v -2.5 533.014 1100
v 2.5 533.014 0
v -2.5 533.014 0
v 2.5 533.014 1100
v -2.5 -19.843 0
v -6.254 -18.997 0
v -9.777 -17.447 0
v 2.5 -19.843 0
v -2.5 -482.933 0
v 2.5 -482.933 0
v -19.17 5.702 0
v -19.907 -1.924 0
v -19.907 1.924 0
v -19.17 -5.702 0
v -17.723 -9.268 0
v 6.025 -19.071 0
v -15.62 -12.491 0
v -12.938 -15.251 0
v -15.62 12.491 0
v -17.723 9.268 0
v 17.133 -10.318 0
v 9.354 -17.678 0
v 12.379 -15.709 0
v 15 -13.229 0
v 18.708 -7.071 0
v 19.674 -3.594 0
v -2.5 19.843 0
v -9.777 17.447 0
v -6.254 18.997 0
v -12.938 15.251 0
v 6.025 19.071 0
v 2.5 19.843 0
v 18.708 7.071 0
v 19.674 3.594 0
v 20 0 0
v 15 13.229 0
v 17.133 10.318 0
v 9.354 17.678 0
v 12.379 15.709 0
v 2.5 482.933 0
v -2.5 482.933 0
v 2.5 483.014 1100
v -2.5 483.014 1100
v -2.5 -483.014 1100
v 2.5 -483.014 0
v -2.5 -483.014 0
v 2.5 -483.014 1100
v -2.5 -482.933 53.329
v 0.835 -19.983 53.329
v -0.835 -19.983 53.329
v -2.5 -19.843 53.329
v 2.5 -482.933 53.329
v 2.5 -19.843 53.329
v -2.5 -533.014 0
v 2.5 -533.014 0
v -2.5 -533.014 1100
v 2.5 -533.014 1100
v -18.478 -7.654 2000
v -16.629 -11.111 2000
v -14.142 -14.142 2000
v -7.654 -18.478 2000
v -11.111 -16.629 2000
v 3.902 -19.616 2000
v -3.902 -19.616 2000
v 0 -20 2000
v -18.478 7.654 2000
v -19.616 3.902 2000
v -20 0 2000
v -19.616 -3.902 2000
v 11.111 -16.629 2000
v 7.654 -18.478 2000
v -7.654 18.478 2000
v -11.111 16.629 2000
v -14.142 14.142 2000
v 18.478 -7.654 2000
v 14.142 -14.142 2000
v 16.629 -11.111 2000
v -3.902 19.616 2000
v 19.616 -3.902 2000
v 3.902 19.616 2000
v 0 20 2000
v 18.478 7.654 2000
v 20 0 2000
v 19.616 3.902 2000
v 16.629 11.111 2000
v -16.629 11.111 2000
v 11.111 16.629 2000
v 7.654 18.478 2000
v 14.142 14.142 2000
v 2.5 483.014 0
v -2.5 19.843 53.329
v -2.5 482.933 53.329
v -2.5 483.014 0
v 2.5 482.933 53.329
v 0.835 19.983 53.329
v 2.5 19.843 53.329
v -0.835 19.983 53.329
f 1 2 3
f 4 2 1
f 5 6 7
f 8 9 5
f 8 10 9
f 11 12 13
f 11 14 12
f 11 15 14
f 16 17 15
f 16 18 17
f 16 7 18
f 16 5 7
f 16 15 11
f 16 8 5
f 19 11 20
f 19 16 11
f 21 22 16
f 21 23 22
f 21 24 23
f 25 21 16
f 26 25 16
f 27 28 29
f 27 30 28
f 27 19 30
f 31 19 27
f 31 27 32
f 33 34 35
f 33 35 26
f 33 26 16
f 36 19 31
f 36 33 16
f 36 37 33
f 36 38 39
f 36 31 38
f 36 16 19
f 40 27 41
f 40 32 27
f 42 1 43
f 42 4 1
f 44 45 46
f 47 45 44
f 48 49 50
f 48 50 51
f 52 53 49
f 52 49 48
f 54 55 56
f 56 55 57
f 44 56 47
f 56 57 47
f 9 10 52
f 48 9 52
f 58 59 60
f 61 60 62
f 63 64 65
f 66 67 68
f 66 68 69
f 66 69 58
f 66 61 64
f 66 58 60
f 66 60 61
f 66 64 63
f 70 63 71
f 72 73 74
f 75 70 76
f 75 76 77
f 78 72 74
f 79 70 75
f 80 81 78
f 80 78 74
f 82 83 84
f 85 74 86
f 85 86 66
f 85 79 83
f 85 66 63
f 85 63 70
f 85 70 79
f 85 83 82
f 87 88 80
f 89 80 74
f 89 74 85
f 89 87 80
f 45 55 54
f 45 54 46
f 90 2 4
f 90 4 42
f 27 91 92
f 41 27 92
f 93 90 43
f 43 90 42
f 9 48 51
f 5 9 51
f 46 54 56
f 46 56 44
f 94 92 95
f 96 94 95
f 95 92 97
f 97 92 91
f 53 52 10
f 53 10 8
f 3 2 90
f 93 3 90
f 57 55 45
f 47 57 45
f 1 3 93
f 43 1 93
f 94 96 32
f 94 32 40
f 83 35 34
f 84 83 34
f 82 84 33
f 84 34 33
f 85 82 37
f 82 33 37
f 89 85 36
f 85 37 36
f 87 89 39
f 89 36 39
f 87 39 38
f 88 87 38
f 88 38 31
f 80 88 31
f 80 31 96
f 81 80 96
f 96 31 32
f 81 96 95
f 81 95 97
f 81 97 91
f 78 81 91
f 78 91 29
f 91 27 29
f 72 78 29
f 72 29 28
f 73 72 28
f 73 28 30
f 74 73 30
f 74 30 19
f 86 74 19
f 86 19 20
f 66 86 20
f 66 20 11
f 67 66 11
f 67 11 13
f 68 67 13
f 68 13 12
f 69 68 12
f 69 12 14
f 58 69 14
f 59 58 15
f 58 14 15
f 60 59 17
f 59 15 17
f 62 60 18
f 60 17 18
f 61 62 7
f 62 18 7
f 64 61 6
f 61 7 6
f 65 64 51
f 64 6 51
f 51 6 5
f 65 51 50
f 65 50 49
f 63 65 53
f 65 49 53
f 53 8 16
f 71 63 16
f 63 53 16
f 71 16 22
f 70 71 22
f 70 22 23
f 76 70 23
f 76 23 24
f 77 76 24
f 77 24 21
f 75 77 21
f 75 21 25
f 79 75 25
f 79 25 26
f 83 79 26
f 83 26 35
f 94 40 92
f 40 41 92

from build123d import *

# Parameters (mm, degrees)
F0_R      = 20
F1_DEPTH  = 2000
F2_W      = 482.932776
F2_H      = 53.329304
F3_DEPTH  = 2.5
F4_DEPTH  = 2.5
F5_W      = 50
F5_H      = 1100
F6_DEPTH  = 2.5
F6_FACE_W = 50
F6_FACE_H = 1100
F7_DEPTH  = 2.5
F8_DEPTH  = 2.5


with BuildPart() as f1:
    # F0 (on Top) → F1 (new body)
    with BuildSketch(Plane.XY):
        Circle(F0_R)
    extrude(amount=F1_DEPTH)

    # F2 (on Right) → F3 (join)
    with BuildSketch(Plane.YZ):
        with Locations((-241.466388, 26.664652)):
            Rectangle(F2_W, F2_H)
        with Locations((241.466388, 26.664652)):
            Rectangle(F2_W, F2_H)
    extrude(amount=F3_DEPTH)

    # F2 (on Right) → F4 (join)
    with BuildSketch(Plane.YZ):
        with Locations((-241.466388, 26.664652)):
            Rectangle(F2_W, F2_H)
        with Locations((241.466388, 26.664652)):
            Rectangle(F2_W, F2_H)
    extrude(amount=-F4_DEPTH)


with BuildPart() as f6:
    # F5 (on Right) → F6 (new body)
    with BuildSketch(Plane.YZ):
        with Locations((-508.0136, 550)):
            Rectangle(F5_W, F5_H)
    extrude(amount=F6_DEPTH)

    # F6_face (on face) → F7 (join)
    with BuildSketch(Plane(origin=(2.5, -508.0136, 550), x_dir=(0, 1, 0), z_dir=(1, 0, 0))):
        Rectangle(F6_FACE_W, F6_FACE_H)
    extrude(amount=-F7_DEPTH)

    # F5 (on Right) → F8 (join)
    with BuildSketch(Plane.YZ):
        with Locations((-508.0136, 550)):
            Rectangle(F5_W, F5_H)
    extrude(amount=-F8_DEPTH)


with BuildPart() as f9_1:
    # F9: instance of F6
    add(f6.part.mirror(Plane.XZ))


solid = Compound([f1.part, f6.part, f9_1.part])
